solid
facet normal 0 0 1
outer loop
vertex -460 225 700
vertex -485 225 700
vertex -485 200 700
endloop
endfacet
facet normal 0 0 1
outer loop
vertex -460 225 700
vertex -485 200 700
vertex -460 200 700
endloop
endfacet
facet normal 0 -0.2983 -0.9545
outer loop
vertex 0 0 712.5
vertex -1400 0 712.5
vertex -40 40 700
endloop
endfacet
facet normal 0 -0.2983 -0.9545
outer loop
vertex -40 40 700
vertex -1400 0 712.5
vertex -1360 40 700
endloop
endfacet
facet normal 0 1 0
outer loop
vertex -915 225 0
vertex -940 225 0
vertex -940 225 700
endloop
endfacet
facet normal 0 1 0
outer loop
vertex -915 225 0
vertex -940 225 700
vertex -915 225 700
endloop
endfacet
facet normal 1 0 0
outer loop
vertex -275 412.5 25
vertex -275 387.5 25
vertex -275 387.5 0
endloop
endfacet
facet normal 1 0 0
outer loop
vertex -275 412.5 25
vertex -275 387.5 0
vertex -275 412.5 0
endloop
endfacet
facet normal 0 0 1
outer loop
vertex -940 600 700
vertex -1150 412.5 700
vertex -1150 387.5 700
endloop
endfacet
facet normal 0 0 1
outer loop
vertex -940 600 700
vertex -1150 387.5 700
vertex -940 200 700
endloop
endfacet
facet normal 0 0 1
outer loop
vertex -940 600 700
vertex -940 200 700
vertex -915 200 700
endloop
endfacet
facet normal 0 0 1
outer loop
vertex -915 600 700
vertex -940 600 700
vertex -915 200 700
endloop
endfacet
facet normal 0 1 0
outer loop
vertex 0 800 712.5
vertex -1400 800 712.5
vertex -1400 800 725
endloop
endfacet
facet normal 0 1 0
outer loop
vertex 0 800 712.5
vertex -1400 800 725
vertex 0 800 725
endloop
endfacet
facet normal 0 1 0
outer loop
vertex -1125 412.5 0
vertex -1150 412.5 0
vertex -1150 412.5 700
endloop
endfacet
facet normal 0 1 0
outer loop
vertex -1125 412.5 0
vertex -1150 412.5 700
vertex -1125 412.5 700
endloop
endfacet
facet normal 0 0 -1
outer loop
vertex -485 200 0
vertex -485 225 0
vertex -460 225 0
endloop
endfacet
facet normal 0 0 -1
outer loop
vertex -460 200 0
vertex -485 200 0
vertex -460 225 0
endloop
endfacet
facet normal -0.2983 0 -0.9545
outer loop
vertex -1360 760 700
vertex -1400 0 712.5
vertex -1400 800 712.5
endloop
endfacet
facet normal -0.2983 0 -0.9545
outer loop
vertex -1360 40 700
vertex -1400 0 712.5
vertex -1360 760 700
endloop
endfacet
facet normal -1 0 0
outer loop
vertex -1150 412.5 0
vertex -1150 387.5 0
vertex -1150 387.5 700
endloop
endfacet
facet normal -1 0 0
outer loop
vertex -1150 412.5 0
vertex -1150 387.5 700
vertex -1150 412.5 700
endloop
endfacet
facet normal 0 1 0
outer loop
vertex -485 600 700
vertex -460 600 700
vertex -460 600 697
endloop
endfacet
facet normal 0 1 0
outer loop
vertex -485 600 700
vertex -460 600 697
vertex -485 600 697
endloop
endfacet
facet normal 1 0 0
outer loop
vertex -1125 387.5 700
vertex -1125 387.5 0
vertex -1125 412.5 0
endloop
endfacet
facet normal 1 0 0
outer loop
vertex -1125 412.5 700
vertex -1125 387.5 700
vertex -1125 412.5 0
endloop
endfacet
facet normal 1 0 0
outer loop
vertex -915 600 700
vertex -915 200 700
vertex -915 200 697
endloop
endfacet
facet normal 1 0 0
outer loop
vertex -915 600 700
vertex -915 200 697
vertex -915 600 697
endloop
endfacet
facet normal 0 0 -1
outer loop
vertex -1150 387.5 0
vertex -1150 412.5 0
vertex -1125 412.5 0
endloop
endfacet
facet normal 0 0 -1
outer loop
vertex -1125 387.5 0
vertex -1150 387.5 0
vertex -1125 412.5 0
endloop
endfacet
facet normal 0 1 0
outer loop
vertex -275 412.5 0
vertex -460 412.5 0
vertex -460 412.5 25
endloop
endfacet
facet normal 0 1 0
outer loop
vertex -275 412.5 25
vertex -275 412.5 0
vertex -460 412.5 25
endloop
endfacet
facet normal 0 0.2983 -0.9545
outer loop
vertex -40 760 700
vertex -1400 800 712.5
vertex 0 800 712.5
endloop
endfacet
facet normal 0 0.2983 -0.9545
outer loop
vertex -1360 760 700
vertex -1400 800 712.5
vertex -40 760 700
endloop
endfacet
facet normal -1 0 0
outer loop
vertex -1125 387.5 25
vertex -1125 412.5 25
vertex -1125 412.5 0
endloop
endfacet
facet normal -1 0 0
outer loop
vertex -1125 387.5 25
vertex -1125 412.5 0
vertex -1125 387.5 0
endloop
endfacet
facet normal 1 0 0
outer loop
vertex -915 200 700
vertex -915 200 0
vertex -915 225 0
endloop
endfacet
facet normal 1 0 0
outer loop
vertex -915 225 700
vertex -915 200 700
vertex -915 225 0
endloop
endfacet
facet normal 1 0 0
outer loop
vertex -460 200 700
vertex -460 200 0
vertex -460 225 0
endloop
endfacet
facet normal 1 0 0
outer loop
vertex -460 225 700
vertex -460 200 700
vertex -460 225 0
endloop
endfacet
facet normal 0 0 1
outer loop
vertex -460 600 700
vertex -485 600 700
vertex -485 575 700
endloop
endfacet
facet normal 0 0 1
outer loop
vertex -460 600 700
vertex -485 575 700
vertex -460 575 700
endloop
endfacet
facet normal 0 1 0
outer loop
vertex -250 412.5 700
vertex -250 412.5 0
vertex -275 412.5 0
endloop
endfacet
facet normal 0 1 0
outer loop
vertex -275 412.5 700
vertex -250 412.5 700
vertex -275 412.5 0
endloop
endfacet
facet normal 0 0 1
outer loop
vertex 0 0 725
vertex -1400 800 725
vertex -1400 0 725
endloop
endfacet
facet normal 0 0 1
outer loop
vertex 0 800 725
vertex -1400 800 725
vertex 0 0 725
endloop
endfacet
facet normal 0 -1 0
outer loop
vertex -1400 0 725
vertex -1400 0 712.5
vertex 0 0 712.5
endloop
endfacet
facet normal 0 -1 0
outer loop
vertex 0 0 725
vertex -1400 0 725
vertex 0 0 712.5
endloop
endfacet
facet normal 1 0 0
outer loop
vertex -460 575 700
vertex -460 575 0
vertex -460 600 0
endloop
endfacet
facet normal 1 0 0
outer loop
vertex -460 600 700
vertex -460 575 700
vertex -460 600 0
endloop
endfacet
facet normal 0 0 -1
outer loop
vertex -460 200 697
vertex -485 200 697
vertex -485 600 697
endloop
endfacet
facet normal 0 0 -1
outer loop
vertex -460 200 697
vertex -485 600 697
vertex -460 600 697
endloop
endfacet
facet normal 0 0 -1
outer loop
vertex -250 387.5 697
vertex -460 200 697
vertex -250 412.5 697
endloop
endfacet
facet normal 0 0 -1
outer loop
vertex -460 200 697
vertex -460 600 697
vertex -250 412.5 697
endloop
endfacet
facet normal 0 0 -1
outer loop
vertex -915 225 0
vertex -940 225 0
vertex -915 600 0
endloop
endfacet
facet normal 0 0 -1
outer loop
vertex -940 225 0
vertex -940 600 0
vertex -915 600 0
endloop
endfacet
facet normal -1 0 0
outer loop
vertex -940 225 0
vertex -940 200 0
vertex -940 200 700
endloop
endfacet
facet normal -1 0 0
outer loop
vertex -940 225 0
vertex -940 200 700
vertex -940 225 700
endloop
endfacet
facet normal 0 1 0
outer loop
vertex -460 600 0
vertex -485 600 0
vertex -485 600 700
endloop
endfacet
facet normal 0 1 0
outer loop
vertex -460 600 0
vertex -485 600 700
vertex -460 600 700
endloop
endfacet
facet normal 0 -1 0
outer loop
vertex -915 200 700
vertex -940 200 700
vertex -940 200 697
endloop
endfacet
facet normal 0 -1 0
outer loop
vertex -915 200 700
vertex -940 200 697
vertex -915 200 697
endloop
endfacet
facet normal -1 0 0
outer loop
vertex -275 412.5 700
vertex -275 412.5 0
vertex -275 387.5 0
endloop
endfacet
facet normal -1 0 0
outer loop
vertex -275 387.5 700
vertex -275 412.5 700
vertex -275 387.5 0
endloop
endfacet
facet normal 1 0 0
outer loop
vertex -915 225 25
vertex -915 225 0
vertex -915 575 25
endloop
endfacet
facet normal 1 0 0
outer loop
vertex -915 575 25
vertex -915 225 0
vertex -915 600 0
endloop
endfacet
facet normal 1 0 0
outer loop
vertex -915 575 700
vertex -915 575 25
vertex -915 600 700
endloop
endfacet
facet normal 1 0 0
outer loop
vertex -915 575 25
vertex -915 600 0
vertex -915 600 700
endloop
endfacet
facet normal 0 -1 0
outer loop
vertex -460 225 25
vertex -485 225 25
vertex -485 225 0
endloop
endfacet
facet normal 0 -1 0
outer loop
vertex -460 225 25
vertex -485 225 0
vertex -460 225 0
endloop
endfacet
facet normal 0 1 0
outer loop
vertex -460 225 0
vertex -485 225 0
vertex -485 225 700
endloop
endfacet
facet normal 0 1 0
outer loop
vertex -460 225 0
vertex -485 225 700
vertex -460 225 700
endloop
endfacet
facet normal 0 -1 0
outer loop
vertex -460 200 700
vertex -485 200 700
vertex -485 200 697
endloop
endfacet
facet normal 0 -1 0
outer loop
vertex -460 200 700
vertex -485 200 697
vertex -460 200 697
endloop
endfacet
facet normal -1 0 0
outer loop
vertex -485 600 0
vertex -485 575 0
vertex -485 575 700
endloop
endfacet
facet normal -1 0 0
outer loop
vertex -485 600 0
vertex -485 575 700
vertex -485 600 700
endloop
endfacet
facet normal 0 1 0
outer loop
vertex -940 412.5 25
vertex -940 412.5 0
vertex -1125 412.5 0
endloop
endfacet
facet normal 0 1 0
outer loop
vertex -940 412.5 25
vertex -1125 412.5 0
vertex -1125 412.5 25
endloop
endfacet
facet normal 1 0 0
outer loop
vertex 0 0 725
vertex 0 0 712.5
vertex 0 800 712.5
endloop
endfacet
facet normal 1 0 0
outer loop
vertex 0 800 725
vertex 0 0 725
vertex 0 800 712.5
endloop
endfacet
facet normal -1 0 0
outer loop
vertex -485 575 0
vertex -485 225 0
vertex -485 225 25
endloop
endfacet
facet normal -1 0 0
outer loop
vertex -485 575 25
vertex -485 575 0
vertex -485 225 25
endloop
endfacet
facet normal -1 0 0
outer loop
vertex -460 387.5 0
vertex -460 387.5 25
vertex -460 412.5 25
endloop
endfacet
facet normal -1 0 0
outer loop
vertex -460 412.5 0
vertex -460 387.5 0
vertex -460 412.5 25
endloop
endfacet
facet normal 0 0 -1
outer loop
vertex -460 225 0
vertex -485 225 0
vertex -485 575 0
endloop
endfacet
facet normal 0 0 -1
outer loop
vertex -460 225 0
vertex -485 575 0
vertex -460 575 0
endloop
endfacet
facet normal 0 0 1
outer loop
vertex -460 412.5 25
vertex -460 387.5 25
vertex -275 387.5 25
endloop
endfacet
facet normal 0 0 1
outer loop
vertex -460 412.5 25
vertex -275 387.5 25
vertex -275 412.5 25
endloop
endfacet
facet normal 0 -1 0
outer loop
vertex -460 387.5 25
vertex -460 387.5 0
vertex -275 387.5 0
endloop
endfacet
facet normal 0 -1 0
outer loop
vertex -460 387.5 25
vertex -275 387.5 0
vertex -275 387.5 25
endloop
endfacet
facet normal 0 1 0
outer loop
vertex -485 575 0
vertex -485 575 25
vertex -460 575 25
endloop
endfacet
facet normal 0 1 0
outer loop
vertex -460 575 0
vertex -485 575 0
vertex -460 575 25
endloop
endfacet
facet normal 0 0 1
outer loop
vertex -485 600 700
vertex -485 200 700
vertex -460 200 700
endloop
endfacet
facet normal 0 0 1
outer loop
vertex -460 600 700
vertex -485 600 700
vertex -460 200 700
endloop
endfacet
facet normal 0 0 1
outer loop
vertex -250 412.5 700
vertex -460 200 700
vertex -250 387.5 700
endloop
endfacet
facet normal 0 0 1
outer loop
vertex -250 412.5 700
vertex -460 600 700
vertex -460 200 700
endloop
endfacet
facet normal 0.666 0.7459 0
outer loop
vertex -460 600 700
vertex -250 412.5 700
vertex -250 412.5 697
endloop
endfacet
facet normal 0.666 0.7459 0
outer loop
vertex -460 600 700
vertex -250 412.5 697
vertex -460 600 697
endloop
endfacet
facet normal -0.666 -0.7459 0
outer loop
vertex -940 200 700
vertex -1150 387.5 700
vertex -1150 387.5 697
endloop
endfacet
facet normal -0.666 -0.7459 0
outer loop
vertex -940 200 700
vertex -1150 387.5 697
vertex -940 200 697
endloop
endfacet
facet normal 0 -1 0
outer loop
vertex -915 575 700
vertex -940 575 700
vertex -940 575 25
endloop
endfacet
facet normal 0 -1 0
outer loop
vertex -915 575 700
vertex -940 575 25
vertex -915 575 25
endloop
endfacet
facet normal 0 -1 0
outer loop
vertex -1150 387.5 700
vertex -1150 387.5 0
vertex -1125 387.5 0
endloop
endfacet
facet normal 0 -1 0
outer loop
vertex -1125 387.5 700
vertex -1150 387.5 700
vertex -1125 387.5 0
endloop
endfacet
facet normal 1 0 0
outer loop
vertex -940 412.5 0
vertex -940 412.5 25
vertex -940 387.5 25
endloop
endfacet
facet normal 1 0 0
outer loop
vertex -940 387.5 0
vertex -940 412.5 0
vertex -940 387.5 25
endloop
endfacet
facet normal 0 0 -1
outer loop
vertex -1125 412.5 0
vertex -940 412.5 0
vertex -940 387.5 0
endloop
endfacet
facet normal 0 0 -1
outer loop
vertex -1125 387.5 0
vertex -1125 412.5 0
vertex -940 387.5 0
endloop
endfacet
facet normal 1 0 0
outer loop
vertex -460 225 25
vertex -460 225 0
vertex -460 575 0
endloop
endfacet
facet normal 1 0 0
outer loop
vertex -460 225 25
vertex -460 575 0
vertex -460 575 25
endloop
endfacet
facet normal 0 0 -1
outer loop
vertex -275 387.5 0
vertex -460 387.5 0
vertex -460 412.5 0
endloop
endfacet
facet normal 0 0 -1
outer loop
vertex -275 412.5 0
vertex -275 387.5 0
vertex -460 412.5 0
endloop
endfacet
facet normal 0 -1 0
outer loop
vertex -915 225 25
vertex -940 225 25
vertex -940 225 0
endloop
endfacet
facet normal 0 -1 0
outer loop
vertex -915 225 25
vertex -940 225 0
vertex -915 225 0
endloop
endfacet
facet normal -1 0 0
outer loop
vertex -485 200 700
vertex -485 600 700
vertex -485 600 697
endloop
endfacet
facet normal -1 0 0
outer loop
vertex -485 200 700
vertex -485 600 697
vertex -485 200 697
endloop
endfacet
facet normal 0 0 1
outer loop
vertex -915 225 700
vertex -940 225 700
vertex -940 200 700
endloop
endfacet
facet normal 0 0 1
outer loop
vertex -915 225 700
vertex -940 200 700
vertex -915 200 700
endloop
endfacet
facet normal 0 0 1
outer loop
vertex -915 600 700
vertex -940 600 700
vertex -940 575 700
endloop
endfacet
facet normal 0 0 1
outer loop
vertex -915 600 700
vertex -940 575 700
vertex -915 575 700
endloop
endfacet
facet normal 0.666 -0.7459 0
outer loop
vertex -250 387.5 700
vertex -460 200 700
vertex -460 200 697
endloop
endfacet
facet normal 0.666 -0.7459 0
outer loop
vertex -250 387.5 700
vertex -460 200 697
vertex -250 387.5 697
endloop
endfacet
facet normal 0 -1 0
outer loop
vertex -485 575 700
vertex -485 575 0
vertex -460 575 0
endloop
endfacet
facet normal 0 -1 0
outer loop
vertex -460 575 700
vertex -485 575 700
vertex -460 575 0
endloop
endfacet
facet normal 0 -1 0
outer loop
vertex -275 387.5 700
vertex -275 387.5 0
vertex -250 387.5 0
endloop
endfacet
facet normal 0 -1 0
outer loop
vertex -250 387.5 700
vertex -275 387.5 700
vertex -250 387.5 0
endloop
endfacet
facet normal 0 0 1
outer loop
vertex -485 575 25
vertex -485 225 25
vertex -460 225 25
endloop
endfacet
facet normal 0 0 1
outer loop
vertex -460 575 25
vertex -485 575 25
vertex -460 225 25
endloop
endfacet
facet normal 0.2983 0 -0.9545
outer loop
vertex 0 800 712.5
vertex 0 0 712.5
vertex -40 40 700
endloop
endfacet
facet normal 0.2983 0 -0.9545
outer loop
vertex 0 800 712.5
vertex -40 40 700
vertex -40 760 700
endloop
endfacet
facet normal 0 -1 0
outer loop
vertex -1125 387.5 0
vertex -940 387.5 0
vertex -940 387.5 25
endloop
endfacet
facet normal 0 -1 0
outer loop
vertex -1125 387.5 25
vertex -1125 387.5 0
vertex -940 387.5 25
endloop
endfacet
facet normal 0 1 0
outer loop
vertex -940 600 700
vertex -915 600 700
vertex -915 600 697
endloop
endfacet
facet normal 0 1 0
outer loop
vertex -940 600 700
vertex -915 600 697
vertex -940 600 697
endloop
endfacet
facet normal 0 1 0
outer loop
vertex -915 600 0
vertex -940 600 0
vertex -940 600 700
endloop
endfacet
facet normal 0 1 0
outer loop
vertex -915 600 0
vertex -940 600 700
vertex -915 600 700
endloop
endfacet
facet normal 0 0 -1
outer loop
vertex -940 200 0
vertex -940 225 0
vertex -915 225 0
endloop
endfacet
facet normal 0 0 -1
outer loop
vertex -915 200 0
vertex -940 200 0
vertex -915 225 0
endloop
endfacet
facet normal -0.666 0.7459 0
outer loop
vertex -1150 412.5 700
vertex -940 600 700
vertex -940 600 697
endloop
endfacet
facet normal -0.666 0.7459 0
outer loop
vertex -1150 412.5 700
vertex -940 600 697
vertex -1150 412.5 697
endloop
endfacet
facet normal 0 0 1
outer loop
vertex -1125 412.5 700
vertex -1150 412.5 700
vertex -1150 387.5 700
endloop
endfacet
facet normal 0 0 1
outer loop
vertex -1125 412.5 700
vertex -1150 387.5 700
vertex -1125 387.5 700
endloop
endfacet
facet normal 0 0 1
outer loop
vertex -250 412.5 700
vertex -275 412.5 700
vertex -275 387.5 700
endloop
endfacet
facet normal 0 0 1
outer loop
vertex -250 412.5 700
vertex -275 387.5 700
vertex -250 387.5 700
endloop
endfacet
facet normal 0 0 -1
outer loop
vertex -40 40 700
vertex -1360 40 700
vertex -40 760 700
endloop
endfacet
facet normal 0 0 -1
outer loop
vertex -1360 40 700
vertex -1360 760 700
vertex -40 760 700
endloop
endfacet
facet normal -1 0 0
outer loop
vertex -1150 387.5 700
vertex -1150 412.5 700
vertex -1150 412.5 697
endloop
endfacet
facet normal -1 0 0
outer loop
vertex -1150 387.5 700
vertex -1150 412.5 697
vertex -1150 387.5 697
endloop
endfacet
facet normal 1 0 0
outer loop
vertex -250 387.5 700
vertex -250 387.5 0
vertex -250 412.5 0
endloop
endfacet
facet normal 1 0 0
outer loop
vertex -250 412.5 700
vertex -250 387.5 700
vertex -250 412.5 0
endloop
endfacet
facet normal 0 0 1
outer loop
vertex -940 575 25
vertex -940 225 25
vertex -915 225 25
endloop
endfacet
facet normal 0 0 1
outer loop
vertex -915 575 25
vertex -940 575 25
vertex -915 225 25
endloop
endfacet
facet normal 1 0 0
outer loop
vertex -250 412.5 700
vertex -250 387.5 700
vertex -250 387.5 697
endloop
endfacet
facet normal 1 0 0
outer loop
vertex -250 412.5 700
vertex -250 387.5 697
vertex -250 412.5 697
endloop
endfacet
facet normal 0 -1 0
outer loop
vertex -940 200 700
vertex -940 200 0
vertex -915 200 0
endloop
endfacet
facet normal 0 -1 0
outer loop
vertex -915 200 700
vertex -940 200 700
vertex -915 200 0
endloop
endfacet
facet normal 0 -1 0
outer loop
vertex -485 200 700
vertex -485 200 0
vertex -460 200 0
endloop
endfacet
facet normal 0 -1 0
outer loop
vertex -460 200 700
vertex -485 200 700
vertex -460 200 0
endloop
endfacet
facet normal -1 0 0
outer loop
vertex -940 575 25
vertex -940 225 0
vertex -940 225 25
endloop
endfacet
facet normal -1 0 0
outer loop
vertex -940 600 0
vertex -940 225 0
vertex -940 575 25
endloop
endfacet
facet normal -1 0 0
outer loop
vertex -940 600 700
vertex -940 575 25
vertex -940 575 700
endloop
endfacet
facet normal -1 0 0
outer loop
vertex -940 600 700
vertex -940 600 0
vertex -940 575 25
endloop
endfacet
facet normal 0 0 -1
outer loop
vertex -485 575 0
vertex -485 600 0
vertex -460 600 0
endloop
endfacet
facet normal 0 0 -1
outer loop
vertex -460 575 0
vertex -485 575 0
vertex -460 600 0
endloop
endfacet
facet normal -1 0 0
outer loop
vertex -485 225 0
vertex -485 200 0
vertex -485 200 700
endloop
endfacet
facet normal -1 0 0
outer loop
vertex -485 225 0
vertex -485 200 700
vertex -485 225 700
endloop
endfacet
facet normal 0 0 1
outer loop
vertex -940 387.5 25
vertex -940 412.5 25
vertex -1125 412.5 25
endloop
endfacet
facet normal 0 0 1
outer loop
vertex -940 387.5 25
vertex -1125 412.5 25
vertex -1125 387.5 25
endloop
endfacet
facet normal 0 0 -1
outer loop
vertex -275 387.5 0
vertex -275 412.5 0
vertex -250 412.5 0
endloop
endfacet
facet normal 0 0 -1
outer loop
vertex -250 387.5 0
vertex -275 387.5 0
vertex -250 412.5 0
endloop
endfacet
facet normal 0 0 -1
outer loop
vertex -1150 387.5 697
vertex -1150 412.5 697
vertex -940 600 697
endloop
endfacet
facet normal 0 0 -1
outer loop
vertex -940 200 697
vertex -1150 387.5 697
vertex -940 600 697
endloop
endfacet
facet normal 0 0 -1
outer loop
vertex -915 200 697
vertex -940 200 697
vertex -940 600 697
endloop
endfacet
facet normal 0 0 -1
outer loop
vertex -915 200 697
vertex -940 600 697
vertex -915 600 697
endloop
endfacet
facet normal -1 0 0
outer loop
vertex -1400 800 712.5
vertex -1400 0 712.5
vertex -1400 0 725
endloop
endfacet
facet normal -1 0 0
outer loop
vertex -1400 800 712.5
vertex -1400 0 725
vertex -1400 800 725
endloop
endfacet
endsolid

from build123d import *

# Parameters (mm, degrees)
F0_W      = 25
F0_H      = 25
F1_DEPTH  = 700
F3_W      = 25
F3_H      = 25
F4_DEPTH  = 350
F6_W      = 25
F6_H      = 25
F7_DEPTH  = 185
F9_W      = 25
F9_H      = 25
F10_DEPTH = 350
F12_W     = 25
F12_H     = 25
F13_DEPTH = 185
F16_DEPTH = 3
F18_W     = 1400
F18_H     = 800
F19_DEPTH = 25
F20_SIZE2 = 12.5
F20_SIZE  = 40


with BuildPart() as f1:
    # F0 (on Top) → F1 (new body)
    with BuildSketch(Plane.XY):
        with Locations((-472.5, 587.5)):
            Rectangle(F0_W, F0_H)
    extrude(amount=F1_DEPTH)


with BuildPart() as f1b:
    # F0 (on Top) → F1, piece 2 (new body)
    with BuildSketch(Plane.XY):
        Polygon((-250, 387.5), (-250, 400), (-250, 412.5), (-275, 412.5), (-275, 387.5), align=None)
    extrude(amount=F1_DEPTH)


with BuildPart() as f1c:
    # F0 (on Top) → F1, piece 3 (new body)
    with BuildSketch(Plane.XY):
        with Locations((-472.5, 212.5)):
            Rectangle(F0_W, F0_H)
    extrude(amount=F1_DEPTH)


with BuildPart() as f1d:
    # F0 (on Top) → F1, piece 4 (new body)
    with BuildSketch(Plane.XY):
        with Locations((-927.5, 587.5)):
            Rectangle(F0_W, F0_H)
    extrude(amount=F1_DEPTH)

    # F9 (on offset) → F10 (join)
    with BuildSketch(Plane.XZ.offset(-575)):
        with Locations((-927.5, 12.5)):
            Rectangle(F9_W, F9_H)
    extrude(amount=F10_DEPTH)


with BuildPart() as f1e:
    # F0 (on Top) → F1, piece 5 (new body)
    with BuildSketch(Plane.XY):
        with Locations((-927.5, 212.5)):
            Rectangle(F0_W, F0_H)
    extrude(amount=F1_DEPTH)


with BuildPart() as f1f:
    # F0 (on Top) → F1, piece 6 (new body)
    with BuildSketch(Plane.XY):
        with Locations((-1137.5, 400)):
            Rectangle(F0_W, F0_H)
    extrude(amount=F1_DEPTH)


with BuildPart() as f4:
    # F3 (on offset) → F4 (new body)
    with BuildSketch(Plane.XZ.offset(-575)):
        with Locations((-472.5, 12.5)):
            Rectangle(F3_W, F3_H)
    extrude(amount=F4_DEPTH)


with BuildPart() as f7:
    # F6 (on offset) → F7 (new body)
    with BuildSketch(Plane.YZ.offset(-460)):
        with Locations((400, 12.5)):
            Rectangle(F6_W, F6_H)
    extrude(amount=F7_DEPTH)


with BuildPart() as f13:
    # F12 (on offset) → F13 (new body)
    with BuildSketch(Plane(origin=(-940, 0, 0), x_dir=(0, -1, 0), z_dir=(-1, 0, 0))):
        with Locations((-400, 12.5)):
            Rectangle(F12_W, F12_H)
    extrude(amount=F13_DEPTH)


with BuildPart() as f16:
    # F15 (on offset) → F16 (new body)
    with BuildSketch(Plane.XY.offset(700)):
        Polygon((-250, 387.5), (-250, 400), (-250, 412.5), (-460, 600), (-485, 600), (-485, 400), (-485, 200), (-460, 200), align=None)
    extrude(amount=-F16_DEPTH)


with BuildPart() as f16b:
    # F15 (on offset) → F16, piece 2 (new body)
    with BuildSketch(Plane.XY.offset(700)):
        Polygon((-915, 600), (-940, 600), (-1150, 412.5), (-1150, 400), (-1150, 387.5), (-940, 200), (-915, 200), (-915, 400), align=None)
    extrude(amount=-F16_DEPTH)


with BuildPart() as f19:
    # F18 (on offset) → F19 (new body)
    with BuildSketch(Plane.XY.offset(700)):
        with Locations((-700, 400)):
            Rectangle(F18_W, F18_H)
    extrude(amount=F19_DEPTH)

    # F20
    f20_edges = [f19.edges().sort_by_distance(p)[0] for p in [
        (-700, 0, 700),
        (0, 400, 700),
        (-700, 800, 700),
        (-1400, 400, 700),
    ]]
    f20_side = f19.faces().sort_by_distance((-700, 400, 700))[0]
    chamfer(f20_edges, length=F20_SIZE, length2=F20_SIZE2, reference=f20_side)


solid = Compound([f1.part, f1b.part, f1c.part, f1d.part, f1e.part, f1f.part, f4.part, f7.part, f13.part, f16.part, f16b.part, f19.part])
